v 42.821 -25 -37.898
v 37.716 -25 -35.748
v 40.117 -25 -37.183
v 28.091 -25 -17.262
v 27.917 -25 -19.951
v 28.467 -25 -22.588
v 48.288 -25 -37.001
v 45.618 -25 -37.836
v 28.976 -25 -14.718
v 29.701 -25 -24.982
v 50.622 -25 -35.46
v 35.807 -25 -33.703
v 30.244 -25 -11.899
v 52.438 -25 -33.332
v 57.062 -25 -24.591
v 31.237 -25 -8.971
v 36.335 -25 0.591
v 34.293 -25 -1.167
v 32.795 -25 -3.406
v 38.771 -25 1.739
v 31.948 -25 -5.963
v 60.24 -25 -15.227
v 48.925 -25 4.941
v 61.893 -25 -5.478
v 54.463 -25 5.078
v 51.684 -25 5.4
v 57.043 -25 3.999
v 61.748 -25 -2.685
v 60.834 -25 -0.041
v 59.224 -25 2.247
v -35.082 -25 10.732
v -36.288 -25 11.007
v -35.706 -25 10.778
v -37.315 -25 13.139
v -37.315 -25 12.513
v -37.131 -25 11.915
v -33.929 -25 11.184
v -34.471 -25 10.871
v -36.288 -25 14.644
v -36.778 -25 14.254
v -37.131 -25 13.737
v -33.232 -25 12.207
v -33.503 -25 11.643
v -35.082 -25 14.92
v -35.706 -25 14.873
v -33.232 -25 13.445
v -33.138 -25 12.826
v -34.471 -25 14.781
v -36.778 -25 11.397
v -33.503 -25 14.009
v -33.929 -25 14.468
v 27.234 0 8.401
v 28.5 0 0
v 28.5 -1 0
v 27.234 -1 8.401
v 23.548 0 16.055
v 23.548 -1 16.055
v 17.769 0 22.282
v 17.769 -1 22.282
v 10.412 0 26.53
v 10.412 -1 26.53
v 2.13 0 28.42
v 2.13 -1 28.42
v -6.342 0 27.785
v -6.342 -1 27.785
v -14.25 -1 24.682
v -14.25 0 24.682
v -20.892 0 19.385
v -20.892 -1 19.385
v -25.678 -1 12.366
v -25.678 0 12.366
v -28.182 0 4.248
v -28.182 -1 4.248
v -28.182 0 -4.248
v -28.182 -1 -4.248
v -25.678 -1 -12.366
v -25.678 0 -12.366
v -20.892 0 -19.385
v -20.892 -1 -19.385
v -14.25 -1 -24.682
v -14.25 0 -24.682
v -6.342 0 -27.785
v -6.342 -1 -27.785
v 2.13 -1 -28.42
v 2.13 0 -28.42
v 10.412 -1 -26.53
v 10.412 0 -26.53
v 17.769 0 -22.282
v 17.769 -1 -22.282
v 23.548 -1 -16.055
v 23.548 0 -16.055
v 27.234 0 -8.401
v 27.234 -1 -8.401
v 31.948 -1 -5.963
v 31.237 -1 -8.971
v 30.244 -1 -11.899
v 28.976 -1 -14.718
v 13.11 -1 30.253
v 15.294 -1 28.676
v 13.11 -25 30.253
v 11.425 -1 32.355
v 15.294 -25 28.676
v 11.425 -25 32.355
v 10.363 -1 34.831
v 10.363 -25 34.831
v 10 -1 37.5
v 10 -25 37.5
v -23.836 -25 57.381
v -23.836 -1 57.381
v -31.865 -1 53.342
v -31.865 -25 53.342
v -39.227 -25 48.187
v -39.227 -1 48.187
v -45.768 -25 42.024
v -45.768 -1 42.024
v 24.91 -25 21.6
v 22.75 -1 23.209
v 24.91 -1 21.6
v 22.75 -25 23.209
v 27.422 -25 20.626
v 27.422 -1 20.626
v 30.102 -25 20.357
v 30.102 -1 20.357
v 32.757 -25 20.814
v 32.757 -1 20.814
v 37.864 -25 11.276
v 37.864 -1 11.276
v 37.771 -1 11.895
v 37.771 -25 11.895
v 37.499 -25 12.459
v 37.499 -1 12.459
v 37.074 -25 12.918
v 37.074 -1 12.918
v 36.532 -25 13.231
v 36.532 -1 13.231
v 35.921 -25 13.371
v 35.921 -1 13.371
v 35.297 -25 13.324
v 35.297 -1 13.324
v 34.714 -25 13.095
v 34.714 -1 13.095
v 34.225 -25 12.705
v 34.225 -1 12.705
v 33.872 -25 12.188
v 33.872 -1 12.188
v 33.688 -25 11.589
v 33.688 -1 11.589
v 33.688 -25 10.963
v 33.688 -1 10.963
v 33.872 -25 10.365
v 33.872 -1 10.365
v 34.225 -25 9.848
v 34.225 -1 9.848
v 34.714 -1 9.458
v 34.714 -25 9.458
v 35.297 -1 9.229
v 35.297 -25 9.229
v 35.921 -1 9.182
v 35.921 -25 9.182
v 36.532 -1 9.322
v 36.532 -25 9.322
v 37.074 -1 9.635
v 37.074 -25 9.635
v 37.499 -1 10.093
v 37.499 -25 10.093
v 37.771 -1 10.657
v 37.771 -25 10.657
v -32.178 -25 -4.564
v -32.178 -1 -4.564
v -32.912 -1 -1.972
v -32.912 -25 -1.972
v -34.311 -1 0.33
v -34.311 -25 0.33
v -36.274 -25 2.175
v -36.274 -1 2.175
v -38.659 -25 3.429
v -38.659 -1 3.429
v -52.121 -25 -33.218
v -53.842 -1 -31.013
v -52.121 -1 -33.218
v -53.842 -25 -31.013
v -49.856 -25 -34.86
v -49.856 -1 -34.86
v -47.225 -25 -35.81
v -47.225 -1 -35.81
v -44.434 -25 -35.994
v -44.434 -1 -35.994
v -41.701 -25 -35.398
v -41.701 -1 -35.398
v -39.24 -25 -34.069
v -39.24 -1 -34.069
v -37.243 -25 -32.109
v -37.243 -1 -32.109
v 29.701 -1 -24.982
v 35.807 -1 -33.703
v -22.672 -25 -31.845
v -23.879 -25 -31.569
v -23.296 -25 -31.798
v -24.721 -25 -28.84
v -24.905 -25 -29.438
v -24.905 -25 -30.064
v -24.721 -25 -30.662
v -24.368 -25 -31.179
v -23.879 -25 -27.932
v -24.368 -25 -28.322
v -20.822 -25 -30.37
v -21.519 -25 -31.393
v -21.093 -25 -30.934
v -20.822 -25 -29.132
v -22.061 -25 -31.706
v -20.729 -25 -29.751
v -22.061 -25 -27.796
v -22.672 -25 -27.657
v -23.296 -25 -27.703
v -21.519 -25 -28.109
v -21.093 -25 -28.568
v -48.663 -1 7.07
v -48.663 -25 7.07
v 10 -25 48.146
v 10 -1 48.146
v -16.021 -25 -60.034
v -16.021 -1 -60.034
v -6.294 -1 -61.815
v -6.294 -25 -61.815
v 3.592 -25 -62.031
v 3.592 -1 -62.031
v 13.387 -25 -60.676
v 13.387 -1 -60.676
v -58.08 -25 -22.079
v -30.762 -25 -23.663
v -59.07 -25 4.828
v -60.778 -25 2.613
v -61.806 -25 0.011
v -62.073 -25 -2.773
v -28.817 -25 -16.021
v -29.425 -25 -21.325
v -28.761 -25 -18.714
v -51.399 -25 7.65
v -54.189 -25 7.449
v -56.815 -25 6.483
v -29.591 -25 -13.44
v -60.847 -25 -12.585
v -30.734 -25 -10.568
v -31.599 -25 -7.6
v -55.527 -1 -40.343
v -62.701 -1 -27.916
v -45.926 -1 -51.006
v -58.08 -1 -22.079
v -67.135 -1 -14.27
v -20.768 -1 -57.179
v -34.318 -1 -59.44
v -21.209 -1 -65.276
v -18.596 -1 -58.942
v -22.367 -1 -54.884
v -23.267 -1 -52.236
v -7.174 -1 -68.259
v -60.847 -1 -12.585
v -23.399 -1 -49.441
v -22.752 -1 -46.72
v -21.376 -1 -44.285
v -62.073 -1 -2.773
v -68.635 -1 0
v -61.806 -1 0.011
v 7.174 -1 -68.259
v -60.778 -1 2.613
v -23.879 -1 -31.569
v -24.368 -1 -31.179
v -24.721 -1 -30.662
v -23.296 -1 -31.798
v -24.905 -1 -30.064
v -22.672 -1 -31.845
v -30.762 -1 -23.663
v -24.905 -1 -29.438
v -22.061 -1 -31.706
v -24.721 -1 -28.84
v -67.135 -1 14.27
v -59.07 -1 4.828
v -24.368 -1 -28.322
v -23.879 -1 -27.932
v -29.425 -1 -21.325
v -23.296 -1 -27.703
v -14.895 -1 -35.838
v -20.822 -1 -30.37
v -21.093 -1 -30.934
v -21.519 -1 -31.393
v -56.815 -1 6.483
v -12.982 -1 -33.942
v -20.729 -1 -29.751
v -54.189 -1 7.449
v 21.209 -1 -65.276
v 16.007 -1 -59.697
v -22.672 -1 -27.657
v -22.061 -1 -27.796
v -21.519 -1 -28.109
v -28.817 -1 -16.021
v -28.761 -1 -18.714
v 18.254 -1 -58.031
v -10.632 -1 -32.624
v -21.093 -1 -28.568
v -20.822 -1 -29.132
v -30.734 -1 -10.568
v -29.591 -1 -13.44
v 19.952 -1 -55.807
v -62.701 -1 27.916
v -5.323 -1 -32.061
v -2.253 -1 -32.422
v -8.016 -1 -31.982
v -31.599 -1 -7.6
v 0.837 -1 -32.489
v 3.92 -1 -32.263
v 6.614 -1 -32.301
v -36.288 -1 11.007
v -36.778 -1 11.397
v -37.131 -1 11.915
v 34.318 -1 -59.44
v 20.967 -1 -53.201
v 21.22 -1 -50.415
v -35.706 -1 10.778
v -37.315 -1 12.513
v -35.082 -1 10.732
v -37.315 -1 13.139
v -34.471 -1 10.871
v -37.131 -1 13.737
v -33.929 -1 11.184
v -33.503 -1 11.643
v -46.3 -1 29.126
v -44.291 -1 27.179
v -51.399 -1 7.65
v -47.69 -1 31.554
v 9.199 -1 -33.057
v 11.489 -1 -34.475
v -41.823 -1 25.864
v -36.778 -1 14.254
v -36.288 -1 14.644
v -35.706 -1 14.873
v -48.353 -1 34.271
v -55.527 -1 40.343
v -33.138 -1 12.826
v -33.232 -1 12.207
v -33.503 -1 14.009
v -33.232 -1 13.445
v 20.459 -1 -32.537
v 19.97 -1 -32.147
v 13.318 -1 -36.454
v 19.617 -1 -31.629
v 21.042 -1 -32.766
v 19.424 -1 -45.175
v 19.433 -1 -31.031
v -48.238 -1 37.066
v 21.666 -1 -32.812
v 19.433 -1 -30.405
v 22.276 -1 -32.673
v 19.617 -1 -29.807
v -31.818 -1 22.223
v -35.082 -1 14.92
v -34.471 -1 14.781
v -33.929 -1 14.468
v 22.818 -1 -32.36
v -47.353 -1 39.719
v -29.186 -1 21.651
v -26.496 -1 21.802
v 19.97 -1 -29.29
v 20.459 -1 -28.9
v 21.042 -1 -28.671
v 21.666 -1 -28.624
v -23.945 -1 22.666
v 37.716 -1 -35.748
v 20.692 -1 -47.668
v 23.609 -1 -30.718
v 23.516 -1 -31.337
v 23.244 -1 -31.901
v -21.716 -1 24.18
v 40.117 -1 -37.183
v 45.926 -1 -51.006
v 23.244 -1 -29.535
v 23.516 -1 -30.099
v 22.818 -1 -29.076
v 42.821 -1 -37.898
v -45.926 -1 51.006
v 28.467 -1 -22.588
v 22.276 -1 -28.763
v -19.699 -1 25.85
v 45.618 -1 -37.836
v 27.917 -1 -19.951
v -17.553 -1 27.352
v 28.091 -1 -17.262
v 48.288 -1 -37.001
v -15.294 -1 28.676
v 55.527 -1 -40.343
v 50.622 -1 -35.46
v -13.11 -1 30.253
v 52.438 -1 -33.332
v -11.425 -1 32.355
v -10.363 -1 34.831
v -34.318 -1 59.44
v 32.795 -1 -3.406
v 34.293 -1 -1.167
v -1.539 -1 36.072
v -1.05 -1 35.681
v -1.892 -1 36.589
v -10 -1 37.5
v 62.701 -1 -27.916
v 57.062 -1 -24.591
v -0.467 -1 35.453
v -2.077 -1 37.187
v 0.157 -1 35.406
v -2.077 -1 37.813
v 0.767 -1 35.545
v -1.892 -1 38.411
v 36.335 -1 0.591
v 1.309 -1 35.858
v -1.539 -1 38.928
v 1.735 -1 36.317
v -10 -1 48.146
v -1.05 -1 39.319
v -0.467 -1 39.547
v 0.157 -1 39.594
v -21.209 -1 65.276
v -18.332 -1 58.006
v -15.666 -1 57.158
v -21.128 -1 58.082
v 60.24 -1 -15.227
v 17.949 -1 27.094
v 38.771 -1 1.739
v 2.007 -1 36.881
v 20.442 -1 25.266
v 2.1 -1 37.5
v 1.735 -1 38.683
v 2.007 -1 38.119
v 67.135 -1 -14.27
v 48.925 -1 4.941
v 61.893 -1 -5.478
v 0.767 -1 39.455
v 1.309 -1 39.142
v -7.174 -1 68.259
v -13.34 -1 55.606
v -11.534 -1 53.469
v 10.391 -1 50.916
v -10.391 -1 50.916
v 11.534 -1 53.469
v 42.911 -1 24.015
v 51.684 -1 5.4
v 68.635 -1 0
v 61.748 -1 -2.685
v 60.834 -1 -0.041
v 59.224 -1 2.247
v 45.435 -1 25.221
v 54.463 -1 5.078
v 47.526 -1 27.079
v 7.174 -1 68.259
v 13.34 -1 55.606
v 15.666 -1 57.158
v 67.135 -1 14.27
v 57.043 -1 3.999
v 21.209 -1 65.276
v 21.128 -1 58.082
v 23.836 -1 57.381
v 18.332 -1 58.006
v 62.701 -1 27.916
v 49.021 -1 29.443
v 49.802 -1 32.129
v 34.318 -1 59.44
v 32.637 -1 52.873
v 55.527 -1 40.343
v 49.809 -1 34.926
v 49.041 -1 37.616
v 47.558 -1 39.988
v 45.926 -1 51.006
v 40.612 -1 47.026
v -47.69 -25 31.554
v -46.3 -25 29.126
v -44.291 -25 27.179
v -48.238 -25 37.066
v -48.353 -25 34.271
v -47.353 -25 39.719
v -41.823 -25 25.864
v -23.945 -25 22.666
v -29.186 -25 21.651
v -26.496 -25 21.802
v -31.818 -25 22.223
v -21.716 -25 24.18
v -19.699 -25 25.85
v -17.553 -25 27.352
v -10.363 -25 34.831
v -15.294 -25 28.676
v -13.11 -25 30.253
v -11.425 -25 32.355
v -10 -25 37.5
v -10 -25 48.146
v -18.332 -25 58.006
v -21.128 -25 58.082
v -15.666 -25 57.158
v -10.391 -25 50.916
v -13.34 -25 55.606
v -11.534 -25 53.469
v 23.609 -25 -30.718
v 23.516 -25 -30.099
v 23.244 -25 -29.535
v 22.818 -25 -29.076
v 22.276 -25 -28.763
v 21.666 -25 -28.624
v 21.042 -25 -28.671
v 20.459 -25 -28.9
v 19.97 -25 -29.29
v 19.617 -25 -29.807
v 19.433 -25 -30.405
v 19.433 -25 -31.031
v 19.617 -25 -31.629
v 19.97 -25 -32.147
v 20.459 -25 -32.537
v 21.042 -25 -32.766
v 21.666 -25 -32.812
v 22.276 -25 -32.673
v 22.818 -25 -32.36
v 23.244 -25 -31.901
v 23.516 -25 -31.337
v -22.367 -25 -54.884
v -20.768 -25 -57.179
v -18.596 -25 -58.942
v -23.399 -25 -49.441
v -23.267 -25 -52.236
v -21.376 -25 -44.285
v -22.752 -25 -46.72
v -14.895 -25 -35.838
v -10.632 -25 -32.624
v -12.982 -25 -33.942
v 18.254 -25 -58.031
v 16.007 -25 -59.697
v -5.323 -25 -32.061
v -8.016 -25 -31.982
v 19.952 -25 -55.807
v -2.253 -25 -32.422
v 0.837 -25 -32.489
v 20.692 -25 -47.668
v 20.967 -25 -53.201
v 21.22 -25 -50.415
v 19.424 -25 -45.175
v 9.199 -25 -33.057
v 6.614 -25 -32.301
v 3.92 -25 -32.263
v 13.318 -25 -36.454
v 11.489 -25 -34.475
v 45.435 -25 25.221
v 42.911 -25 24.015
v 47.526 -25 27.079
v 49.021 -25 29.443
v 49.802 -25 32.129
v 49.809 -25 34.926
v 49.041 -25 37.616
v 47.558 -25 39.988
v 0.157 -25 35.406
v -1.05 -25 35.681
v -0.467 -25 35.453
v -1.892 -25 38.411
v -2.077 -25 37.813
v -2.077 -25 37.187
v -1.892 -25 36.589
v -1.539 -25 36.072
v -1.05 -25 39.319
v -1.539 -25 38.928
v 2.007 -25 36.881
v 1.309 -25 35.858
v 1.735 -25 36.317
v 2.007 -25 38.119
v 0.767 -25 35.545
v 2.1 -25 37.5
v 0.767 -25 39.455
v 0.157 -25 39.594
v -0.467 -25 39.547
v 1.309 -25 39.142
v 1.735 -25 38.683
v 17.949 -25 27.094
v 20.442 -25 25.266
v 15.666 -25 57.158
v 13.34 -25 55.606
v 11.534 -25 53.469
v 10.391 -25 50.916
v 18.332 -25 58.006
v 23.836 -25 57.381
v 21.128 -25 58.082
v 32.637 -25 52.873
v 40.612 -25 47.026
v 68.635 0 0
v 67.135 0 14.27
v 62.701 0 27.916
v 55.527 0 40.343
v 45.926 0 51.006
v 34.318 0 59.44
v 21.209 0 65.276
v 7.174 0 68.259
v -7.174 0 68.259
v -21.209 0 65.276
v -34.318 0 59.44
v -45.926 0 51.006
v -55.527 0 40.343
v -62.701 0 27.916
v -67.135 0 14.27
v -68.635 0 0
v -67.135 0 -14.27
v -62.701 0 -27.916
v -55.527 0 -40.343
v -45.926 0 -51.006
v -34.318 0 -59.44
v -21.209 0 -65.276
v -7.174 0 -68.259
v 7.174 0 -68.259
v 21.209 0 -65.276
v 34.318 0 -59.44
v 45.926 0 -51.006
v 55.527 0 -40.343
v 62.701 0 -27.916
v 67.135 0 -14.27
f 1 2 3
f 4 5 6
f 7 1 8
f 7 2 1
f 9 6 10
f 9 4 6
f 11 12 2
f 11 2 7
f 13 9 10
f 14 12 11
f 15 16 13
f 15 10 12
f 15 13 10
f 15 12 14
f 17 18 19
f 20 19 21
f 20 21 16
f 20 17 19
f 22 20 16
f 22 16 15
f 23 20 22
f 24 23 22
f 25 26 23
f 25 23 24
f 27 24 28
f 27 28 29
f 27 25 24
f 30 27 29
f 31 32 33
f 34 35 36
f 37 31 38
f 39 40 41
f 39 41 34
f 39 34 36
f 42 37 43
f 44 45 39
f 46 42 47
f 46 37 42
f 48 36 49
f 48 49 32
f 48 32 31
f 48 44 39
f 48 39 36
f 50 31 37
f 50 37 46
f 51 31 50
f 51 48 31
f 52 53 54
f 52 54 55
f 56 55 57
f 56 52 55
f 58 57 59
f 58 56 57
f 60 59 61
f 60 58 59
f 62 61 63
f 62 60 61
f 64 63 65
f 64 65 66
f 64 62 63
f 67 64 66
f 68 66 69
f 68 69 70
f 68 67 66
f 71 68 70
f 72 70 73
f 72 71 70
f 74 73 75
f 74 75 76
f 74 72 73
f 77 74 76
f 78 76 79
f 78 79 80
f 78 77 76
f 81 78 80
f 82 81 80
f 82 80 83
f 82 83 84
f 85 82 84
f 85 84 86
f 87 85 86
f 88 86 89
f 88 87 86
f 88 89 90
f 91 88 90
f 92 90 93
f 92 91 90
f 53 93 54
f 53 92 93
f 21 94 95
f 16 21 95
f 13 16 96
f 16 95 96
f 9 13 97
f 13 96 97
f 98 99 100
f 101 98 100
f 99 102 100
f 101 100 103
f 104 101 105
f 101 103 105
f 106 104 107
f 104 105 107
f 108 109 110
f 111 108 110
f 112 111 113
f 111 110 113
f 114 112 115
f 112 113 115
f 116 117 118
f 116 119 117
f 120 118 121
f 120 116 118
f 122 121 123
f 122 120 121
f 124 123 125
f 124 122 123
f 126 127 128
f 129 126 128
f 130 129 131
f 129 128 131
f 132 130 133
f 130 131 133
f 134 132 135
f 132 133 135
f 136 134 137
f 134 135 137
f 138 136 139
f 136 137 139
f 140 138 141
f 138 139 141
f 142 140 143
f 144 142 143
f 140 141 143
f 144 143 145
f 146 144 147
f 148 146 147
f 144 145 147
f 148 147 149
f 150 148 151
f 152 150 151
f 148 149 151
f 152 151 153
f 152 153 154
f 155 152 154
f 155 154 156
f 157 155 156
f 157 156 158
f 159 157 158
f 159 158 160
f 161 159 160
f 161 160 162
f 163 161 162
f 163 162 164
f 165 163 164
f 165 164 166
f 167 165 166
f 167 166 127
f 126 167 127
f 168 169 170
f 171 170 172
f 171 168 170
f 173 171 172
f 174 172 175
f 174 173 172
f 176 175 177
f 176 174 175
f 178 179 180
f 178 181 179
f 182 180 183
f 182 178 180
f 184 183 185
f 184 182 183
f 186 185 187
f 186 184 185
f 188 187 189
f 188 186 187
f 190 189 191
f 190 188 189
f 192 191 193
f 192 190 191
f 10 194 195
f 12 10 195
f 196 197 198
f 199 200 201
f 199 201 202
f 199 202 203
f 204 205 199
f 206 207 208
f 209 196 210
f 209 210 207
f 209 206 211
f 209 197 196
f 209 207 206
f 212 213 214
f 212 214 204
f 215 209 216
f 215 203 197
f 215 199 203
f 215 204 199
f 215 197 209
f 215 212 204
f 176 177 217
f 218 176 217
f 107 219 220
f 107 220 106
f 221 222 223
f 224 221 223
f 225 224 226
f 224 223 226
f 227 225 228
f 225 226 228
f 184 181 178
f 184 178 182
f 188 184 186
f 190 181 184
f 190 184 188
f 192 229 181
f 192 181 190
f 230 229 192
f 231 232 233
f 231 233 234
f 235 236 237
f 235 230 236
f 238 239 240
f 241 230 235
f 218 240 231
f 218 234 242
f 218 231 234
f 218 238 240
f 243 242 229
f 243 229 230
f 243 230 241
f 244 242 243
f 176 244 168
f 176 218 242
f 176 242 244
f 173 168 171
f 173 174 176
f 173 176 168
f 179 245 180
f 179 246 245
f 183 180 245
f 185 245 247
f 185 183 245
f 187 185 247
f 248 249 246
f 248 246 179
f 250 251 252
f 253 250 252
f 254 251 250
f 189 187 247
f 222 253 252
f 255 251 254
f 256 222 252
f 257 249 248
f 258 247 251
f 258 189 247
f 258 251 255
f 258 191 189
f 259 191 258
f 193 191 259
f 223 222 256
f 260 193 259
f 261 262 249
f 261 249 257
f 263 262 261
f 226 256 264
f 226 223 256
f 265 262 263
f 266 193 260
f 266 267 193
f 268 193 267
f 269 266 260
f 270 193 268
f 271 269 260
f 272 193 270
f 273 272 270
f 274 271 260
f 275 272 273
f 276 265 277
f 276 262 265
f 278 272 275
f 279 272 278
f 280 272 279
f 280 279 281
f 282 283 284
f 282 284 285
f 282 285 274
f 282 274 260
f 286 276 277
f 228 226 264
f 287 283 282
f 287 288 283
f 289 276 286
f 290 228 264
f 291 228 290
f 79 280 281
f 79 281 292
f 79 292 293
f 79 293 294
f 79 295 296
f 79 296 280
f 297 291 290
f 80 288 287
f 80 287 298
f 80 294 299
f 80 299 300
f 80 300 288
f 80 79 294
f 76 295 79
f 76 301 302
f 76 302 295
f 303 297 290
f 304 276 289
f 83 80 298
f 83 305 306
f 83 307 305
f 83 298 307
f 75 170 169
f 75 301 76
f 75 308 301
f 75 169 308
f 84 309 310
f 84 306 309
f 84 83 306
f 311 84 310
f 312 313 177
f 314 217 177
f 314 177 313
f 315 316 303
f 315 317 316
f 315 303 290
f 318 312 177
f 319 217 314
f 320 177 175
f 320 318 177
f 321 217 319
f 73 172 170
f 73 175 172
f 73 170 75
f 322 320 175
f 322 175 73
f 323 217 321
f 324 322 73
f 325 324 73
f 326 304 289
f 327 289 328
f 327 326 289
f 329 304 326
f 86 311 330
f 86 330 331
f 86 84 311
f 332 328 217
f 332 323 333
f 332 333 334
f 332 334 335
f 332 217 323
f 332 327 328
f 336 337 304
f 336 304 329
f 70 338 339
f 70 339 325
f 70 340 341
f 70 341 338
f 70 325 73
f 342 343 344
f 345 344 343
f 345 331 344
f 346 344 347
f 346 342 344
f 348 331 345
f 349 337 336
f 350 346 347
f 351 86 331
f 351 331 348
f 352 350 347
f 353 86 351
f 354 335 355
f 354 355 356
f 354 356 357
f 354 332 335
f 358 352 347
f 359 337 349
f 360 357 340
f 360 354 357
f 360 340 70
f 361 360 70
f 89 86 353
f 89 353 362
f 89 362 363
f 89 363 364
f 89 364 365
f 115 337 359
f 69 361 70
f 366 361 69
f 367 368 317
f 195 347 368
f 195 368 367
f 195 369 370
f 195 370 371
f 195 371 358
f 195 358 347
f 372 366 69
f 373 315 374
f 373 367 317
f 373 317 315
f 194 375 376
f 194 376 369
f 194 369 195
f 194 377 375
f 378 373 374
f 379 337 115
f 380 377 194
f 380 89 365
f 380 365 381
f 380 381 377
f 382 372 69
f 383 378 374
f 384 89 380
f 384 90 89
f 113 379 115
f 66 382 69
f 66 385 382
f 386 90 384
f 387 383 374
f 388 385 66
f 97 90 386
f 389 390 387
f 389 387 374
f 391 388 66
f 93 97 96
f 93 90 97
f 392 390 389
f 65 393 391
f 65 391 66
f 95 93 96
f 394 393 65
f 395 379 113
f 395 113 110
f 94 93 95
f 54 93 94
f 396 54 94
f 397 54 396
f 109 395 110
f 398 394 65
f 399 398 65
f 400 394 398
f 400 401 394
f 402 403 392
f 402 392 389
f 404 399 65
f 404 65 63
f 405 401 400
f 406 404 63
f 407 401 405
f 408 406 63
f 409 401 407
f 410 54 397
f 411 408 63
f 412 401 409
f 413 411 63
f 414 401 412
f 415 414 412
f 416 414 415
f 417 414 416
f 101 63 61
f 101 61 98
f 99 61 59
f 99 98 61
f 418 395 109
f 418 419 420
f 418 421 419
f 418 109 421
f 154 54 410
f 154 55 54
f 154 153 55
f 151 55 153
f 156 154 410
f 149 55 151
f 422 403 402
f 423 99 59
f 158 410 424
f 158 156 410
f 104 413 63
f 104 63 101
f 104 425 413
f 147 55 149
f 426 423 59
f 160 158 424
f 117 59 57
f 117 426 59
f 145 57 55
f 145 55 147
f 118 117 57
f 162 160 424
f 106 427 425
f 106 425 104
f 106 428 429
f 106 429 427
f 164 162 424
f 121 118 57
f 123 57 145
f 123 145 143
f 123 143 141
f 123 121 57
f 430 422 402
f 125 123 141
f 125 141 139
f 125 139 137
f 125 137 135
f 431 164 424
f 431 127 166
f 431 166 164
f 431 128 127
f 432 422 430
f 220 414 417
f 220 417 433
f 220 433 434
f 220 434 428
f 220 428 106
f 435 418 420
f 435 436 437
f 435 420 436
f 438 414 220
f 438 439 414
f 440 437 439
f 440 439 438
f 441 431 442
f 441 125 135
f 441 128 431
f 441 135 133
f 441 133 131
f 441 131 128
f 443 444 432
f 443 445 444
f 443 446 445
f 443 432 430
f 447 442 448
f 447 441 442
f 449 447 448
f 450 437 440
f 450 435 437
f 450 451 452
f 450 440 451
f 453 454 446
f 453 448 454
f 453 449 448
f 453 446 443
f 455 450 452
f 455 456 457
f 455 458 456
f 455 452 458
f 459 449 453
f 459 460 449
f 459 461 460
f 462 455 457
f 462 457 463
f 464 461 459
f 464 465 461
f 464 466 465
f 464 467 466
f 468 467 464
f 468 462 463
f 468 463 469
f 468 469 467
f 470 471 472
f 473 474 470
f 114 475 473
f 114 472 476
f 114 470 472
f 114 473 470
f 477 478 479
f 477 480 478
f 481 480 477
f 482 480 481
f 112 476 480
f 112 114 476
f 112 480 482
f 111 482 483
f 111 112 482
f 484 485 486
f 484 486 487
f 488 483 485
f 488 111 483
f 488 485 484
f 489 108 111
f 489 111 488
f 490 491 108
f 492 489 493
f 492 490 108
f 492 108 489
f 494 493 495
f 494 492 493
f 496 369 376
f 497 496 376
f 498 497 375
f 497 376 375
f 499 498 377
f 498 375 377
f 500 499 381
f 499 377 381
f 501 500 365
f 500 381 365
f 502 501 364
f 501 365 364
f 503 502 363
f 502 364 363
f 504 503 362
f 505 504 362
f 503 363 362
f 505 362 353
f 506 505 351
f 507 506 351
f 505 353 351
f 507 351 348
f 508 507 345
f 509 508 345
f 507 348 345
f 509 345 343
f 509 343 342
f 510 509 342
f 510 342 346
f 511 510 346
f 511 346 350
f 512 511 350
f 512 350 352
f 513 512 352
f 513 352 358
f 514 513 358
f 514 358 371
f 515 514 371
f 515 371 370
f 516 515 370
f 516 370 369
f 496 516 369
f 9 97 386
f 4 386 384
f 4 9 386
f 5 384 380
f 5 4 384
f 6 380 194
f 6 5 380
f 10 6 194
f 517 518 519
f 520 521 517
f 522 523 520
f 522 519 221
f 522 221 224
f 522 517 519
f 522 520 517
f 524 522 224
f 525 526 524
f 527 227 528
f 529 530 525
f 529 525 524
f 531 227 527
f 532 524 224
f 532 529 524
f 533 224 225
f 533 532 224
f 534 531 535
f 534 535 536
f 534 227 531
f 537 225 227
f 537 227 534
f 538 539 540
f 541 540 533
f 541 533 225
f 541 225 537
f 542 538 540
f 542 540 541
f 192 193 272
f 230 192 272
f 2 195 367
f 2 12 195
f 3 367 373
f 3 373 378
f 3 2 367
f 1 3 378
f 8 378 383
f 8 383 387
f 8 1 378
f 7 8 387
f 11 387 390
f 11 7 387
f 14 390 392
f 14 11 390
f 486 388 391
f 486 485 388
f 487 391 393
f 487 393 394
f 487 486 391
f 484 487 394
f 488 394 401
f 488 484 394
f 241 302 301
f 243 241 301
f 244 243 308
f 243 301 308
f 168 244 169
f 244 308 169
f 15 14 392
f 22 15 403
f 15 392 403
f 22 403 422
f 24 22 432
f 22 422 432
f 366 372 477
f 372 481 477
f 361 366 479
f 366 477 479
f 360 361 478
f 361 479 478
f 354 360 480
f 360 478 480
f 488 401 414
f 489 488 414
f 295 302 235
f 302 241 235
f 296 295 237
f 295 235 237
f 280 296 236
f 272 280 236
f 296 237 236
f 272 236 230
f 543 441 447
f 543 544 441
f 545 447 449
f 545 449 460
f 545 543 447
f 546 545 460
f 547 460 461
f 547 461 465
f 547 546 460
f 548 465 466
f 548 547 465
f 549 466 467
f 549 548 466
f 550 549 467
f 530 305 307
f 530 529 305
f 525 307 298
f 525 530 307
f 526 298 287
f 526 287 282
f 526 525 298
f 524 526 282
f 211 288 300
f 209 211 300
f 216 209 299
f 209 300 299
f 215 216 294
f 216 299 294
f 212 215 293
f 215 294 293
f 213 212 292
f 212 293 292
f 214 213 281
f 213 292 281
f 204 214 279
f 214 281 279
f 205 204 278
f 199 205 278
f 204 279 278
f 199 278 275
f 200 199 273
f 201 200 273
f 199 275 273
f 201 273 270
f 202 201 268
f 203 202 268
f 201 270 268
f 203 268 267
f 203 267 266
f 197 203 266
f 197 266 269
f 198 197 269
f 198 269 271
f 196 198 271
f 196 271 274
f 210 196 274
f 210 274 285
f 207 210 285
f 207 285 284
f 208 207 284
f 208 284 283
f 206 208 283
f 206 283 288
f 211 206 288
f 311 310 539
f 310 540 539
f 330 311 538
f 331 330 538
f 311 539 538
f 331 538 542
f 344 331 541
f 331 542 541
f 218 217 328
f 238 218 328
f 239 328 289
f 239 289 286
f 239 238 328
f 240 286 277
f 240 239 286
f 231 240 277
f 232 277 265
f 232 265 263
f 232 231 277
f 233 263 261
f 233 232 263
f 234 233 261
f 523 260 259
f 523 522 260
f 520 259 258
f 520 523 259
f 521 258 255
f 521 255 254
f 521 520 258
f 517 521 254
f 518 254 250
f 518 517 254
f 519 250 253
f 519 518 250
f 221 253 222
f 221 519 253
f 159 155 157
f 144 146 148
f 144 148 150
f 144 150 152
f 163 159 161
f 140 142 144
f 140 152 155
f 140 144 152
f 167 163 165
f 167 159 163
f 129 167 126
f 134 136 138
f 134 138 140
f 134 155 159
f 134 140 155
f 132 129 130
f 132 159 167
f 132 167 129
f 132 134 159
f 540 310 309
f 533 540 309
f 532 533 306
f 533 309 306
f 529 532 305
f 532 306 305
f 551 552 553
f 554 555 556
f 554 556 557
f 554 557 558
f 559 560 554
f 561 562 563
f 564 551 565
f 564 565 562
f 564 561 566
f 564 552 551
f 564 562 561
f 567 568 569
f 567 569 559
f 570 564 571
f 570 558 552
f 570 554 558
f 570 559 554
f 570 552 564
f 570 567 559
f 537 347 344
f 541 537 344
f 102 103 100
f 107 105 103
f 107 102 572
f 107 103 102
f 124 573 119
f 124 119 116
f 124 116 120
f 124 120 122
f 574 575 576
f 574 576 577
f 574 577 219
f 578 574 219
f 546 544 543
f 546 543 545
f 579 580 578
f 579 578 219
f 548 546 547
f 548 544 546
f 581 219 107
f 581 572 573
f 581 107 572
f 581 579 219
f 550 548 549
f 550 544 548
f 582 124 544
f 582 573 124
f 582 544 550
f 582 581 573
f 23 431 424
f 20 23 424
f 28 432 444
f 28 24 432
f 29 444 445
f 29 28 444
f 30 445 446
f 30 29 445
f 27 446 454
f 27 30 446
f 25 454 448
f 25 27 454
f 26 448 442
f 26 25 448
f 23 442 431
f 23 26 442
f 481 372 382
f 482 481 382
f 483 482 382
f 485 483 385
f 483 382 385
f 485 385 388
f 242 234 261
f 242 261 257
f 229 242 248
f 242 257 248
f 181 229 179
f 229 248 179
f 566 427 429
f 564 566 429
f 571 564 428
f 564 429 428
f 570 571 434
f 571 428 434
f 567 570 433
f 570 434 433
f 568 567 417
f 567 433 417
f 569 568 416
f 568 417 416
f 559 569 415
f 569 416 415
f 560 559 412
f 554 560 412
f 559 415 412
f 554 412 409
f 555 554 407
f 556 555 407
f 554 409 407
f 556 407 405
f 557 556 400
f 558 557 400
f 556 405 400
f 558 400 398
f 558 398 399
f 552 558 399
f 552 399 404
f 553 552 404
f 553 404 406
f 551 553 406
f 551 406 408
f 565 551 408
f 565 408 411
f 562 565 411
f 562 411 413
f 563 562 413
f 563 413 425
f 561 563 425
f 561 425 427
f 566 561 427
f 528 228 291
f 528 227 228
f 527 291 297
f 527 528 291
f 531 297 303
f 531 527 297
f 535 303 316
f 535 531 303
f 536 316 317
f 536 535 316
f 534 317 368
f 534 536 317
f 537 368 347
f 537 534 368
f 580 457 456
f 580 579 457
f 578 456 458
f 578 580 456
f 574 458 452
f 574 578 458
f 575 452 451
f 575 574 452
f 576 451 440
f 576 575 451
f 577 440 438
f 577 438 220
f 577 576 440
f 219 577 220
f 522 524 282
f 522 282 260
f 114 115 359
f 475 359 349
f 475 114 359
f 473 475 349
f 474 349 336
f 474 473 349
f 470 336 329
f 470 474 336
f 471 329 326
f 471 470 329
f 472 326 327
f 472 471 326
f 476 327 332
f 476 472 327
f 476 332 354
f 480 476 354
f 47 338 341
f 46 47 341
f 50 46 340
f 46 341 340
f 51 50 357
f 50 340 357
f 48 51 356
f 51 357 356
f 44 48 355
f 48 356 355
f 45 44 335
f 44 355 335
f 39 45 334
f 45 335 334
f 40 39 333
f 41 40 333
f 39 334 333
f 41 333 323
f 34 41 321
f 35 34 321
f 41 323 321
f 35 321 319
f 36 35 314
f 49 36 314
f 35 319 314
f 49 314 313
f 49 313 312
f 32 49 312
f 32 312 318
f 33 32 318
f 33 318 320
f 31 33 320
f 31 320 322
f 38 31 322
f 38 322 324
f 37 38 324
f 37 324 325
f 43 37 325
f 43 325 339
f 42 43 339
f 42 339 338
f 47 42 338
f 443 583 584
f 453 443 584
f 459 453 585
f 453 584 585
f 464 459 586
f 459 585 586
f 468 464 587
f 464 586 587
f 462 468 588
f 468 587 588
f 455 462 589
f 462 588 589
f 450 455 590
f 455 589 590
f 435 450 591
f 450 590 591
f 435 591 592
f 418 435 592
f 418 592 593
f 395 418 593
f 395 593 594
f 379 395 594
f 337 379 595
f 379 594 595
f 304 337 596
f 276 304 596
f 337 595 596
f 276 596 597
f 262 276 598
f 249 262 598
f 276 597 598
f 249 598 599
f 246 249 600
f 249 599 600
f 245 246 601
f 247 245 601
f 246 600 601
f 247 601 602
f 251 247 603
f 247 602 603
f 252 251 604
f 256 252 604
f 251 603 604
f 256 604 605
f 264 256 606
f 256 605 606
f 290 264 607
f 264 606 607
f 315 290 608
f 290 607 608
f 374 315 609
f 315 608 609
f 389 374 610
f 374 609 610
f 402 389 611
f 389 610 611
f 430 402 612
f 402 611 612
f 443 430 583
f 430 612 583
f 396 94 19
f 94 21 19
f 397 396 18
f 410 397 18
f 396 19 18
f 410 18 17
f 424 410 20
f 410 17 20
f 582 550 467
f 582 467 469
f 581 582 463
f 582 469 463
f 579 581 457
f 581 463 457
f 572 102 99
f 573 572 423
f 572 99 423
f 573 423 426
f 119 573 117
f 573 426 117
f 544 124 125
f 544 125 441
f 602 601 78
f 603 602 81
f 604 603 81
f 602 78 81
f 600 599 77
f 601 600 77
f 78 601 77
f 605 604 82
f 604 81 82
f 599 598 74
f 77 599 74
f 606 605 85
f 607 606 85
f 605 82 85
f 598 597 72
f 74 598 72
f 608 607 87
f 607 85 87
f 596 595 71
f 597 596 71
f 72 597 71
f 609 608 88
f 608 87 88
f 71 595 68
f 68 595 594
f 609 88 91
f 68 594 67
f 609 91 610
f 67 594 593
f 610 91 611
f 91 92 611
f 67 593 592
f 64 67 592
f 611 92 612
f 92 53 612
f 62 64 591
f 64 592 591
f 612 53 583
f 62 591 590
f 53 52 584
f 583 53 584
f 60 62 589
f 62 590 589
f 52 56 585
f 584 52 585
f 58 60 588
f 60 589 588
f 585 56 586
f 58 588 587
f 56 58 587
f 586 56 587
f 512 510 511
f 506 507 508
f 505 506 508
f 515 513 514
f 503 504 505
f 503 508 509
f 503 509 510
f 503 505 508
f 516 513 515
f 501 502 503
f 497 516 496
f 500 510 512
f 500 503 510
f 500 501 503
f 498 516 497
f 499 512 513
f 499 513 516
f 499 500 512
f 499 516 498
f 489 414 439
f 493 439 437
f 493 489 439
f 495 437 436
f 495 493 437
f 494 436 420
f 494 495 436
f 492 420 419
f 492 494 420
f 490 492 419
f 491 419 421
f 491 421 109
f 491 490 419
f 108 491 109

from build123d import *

# Parameters (mm, degrees)
F0_R     = 68.635064
F0_R_2   = 2.1
F0_R_3   = 28.5
F1_DEPTH = 1
F2_DEPTH = 25
F3_R     = 10


with BuildPart() as f1:
    # F0 (on Front) → F1 (new body)
    with BuildSketch(Plane.XZ):
        Circle(F0_R)
        with Locations((-22.828554, -29.75075)):
            Circle(F0_R_2, mode=Mode.SUBTRACT)
        with Locations((21.509116, -30.718202)):
            Circle(F0_R_2, mode=Mode.SUBTRACT)
        with BuildLine():
            ThreePointArc((-10, 30.923292), (0, 32.5), (10, 30.923292))
            Line((10, 30.923292), (10, 61.325086))
            ThreePointArc((10, 61.325086), (36.741063, 50.108487), (55.479716, 27.977979))
            Line((55.479716, 27.977979), (26.48501, 18.835983))
            ThreePointArc((26.48501, 18.835983), (30.959755, 9.886536), (32.5, 0))
            ThreePointArc((32.5, 0), (32.499781, -0.119179), (32.499126, -0.238356))
            Line((32.499126, -0.238356), (61.493832, 8.90364))
            ThreePointArc((61.493832, 8.90364), (58.837564, -19.972662), (43.366145, -44.498805))
            Line((43.366145, -44.498805), (25.928392, -19.595114))
            ThreePointArc((25.928392, -19.595114), (18.641234, -26.622441), (9.545351, -31.066642))
            Line((9.545351, -31.066642), (26.983104, -55.970334))
            ThreePointArc((26.983104, -55.970334), (-1.355469, -62.120278), (-29.398814, -54.740076))
            Line((-29.398814, -54.740076), (-10.891374, -30.620711))
            ThreePointArc((-10.891374, -30.620711), (-19.784746, -25.783984), (-26.758441, -18.445483))
            Line((-26.758441, -18.445483), (-45.265881, -42.564848))
            ThreePointArc((-45.265881, -42.564848), (-59.652759, -17.387194), (-61.046932, 11.577489))
            Line((-61.046932, 11.577489), (-32.478591, 1.179463))
            ThreePointArc((-32.478591, 1.179463), (-30.54001, 11.115655), (-25.638188, 19.973315))
            Line((-25.638188, 19.973315), (-54.20653, 30.371341))
            ThreePointArc((-54.20653, 30.371341), (-35.639209, 50.898065), (-10, 61.325086))
            Line((-10, 61.325086), (-10, 30.923292))
        make_face(mode=Mode.SUBTRACT)
        with Locations((-35.238473, 12.825755)):
            Circle(F0_R_2, mode=Mode.SUBTRACT)
        with Locations((35.764386, 11.276467)):
            Circle(F0_R_2, mode=Mode.SUBTRACT)
        with Locations((0, 37.5)):
            Circle(F0_R_2, mode=Mode.SUBTRACT)
        with BuildLine():
            Line((10, 61.325086), (10, 30.923292))
            ThreePointArc((10, 30.923292), (19.217564, 26.20945), (26.48501, 18.835983))
            Line((26.48501, 18.835983), (55.479716, 27.977979))
            ThreePointArc((55.479716, 27.977979), (36.741063, 50.108487), (10, 61.325086))
        make_face()
        with BuildLine():
            ThreePointArc((-25.638188, 19.973315), (-18.641234, 26.622441), (-10, 30.923292))
            Line((-10, 30.923292), (-10, 61.325086))
            ThreePointArc((-10, 61.325086), (-35.639209, 50.898065), (-54.20653, 30.371341))
            Line((-54.20653, 30.371341), (-25.638188, 19.973315))
        make_face()
        with Locations((0, 37.5)):
            Circle(F0_R_2)
        with Locations((35.764386, 11.276467)):
            Circle(F0_R_2)
        with BuildLine():
            Line((61.493832, 8.90364), (32.499126, -0.238356))
            ThreePointArc((32.499126, -0.238356), (30.775229, -10.446783), (25.928392, -19.595114))
            Line((25.928392, -19.595114), (43.366145, -44.498805))
            ThreePointArc((43.366145, -44.498805), (58.837564, -19.972662), (61.493832, 8.90364))
        make_face()
        with BuildLine():
            Line((26.983104, -55.970334), (9.545351, -31.066642))
            ThreePointArc((9.545351, -31.066642), (-0.708984, -32.492266), (-10.891374, -30.620711))
            Line((-10.891374, -30.620711), (-29.398814, -54.740076))
            ThreePointArc((-29.398814, -54.740076), (-1.355469, -62.120278), (26.983104, -55.970334))
        make_face()
        with BuildLine():
            ThreePointArc((-26.758441, -18.445483), (-31.20162, -9.094443), (-32.478591, 1.179463))
            Line((-32.478591, 1.179463), (-61.046932, 11.577489))
            ThreePointArc((-61.046932, 11.577489), (-59.652759, -17.387194), (-45.265881, -42.564848))
            Line((-45.265881, -42.564848), (-26.758441, -18.445483))
        make_face()
        with Locations((-35.238473, 12.825755)):
            Circle(F0_R_2)
        with BuildLine():
            ThreePointArc((26.48501, 18.835983), (19.217564, 26.20945), (10, 30.923292))
            ThreePointArc((10, 30.923292), (0, 32.5), (-10, 30.923292))
            ThreePointArc((-10, 30.923292), (-18.641234, 26.622441), (-25.638188, 19.973315))
            ThreePointArc((-25.638188, 19.973315), (-30.54001, 11.115655), (-32.478591, 1.179463))
            ThreePointArc((-32.478591, 1.179463), (-31.20162, -9.094443), (-26.758441, -18.445483))
            ThreePointArc((-26.758441, -18.445483), (-19.784746, -25.783984), (-10.891374, -30.620711))
            ThreePointArc((-10.891374, -30.620711), (-0.708984, -32.492266), (9.545351, -31.066642))
            ThreePointArc((9.545351, -31.066642), (18.641234, -26.622441), (25.928392, -19.595114))
            ThreePointArc((25.928392, -19.595114), (30.775229, -10.446783), (32.499126, -0.238356))
            ThreePointArc((32.499126, -0.238356), (32.499781, -0.119179), (32.5, 0))
            ThreePointArc((32.5, 0), (30.959755, 9.886536), (26.48501, 18.835983))
        make_face()
        Circle(F0_R_3, mode=Mode.SUBTRACT)
        with Locations((21.509116, -30.718202)):
            Circle(F0_R_2)
        with Locations((-22.828554, -29.75075)):
            Circle(F0_R_2)
    extrude(amount=F1_DEPTH)

    # F0 (on Front) → F2 (join)
    with BuildSketch(Plane.XZ):
        with BuildLine():
            Line((10, 61.325086), (10, 30.923292))
            ThreePointArc((10, 30.923292), (19.217564, 26.20945), (26.48501, 18.835983))
            Line((26.48501, 18.835983), (55.479716, 27.977979))
            ThreePointArc((55.479716, 27.977979), (36.741063, 50.108487), (10, 61.325086))
        make_face()
        with BuildLine():
            ThreePointArc((-25.638188, 19.973315), (-18.641234, 26.622441), (-10, 30.923292))
            Line((-10, 30.923292), (-10, 61.325086))
            ThreePointArc((-10, 61.325086), (-35.639209, 50.898065), (-54.20653, 30.371341))
            Line((-54.20653, 30.371341), (-25.638188, 19.973315))
        make_face()
        with BuildLine():
            ThreePointArc((-26.758441, -18.445483), (-31.20162, -9.094443), (-32.478591, 1.179463))
            Line((-32.478591, 1.179463), (-61.046932, 11.577489))
            ThreePointArc((-61.046932, 11.577489), (-59.652759, -17.387194), (-45.265881, -42.564848))
            Line((-45.265881, -42.564848), (-26.758441, -18.445483))
        make_face()
        with BuildLine():
            Line((26.983104, -55.970334), (9.545351, -31.066642))
            ThreePointArc((9.545351, -31.066642), (-0.708984, -32.492266), (-10.891374, -30.620711))
            Line((-10.891374, -30.620711), (-29.398814, -54.740076))
            ThreePointArc((-29.398814, -54.740076), (-1.355469, -62.120278), (26.983104, -55.970334))
        make_face()
        with BuildLine():
            Line((61.493832, 8.90364), (32.499126, -0.238356))
            ThreePointArc((32.499126, -0.238356), (30.775229, -10.446783), (25.928392, -19.595114))
            Line((25.928392, -19.595114), (43.366145, -44.498805))
            ThreePointArc((43.366145, -44.498805), (58.837564, -19.972662), (61.493832, 8.90364))
        make_face()
        with Locations((35.764386, 11.276467)):
            Circle(F0_R_2)
        with Locations((21.509116, -30.718202)):
            Circle(F0_R_2)
        with Locations((-22.828554, -29.75075)):
            Circle(F0_R_2)
        with Locations((-35.238473, 12.825755)):
            Circle(F0_R_2)
        with Locations((0, 37.5)):
            Circle(F0_R_2)
    extrude(amount=F2_DEPTH)

    # F3
    f3_edges = [f1.edges().sort_by_distance(p)[0] for p in [
        (-54.20653, -13, 30.371341),
        (-25.638188, -13, 19.973315),
        (-10, -13, 30.923292),
        (-10, -13, 61.325086),
        (-32.478591, -13, 1.179463),
        (-26.758441, -13, -18.445483),
        (-61.046932, -13, 11.577489),
        (-45.265881, -13, -42.564848),
        (-29.398814, -13, -54.740076),
        (26.983104, -13, -55.970334),
        (9.545351, -13, -31.066642),
        (-10.891374, -13, -30.620711),
        (32.499126, -13, -0.238356),
        (25.928392, -13, -19.595114),
        (43.366145, -13, -44.498805),
        (61.493832, -13, 8.90364),
        (55.479716, -13, 27.977979),
        (10, -13, 61.325086),
        (10, -13, 30.923292),
        (26.48501, -13, 18.835983),
    ]]
    fillet(f3_edges, radius=F3_R)


solid = f1.part
